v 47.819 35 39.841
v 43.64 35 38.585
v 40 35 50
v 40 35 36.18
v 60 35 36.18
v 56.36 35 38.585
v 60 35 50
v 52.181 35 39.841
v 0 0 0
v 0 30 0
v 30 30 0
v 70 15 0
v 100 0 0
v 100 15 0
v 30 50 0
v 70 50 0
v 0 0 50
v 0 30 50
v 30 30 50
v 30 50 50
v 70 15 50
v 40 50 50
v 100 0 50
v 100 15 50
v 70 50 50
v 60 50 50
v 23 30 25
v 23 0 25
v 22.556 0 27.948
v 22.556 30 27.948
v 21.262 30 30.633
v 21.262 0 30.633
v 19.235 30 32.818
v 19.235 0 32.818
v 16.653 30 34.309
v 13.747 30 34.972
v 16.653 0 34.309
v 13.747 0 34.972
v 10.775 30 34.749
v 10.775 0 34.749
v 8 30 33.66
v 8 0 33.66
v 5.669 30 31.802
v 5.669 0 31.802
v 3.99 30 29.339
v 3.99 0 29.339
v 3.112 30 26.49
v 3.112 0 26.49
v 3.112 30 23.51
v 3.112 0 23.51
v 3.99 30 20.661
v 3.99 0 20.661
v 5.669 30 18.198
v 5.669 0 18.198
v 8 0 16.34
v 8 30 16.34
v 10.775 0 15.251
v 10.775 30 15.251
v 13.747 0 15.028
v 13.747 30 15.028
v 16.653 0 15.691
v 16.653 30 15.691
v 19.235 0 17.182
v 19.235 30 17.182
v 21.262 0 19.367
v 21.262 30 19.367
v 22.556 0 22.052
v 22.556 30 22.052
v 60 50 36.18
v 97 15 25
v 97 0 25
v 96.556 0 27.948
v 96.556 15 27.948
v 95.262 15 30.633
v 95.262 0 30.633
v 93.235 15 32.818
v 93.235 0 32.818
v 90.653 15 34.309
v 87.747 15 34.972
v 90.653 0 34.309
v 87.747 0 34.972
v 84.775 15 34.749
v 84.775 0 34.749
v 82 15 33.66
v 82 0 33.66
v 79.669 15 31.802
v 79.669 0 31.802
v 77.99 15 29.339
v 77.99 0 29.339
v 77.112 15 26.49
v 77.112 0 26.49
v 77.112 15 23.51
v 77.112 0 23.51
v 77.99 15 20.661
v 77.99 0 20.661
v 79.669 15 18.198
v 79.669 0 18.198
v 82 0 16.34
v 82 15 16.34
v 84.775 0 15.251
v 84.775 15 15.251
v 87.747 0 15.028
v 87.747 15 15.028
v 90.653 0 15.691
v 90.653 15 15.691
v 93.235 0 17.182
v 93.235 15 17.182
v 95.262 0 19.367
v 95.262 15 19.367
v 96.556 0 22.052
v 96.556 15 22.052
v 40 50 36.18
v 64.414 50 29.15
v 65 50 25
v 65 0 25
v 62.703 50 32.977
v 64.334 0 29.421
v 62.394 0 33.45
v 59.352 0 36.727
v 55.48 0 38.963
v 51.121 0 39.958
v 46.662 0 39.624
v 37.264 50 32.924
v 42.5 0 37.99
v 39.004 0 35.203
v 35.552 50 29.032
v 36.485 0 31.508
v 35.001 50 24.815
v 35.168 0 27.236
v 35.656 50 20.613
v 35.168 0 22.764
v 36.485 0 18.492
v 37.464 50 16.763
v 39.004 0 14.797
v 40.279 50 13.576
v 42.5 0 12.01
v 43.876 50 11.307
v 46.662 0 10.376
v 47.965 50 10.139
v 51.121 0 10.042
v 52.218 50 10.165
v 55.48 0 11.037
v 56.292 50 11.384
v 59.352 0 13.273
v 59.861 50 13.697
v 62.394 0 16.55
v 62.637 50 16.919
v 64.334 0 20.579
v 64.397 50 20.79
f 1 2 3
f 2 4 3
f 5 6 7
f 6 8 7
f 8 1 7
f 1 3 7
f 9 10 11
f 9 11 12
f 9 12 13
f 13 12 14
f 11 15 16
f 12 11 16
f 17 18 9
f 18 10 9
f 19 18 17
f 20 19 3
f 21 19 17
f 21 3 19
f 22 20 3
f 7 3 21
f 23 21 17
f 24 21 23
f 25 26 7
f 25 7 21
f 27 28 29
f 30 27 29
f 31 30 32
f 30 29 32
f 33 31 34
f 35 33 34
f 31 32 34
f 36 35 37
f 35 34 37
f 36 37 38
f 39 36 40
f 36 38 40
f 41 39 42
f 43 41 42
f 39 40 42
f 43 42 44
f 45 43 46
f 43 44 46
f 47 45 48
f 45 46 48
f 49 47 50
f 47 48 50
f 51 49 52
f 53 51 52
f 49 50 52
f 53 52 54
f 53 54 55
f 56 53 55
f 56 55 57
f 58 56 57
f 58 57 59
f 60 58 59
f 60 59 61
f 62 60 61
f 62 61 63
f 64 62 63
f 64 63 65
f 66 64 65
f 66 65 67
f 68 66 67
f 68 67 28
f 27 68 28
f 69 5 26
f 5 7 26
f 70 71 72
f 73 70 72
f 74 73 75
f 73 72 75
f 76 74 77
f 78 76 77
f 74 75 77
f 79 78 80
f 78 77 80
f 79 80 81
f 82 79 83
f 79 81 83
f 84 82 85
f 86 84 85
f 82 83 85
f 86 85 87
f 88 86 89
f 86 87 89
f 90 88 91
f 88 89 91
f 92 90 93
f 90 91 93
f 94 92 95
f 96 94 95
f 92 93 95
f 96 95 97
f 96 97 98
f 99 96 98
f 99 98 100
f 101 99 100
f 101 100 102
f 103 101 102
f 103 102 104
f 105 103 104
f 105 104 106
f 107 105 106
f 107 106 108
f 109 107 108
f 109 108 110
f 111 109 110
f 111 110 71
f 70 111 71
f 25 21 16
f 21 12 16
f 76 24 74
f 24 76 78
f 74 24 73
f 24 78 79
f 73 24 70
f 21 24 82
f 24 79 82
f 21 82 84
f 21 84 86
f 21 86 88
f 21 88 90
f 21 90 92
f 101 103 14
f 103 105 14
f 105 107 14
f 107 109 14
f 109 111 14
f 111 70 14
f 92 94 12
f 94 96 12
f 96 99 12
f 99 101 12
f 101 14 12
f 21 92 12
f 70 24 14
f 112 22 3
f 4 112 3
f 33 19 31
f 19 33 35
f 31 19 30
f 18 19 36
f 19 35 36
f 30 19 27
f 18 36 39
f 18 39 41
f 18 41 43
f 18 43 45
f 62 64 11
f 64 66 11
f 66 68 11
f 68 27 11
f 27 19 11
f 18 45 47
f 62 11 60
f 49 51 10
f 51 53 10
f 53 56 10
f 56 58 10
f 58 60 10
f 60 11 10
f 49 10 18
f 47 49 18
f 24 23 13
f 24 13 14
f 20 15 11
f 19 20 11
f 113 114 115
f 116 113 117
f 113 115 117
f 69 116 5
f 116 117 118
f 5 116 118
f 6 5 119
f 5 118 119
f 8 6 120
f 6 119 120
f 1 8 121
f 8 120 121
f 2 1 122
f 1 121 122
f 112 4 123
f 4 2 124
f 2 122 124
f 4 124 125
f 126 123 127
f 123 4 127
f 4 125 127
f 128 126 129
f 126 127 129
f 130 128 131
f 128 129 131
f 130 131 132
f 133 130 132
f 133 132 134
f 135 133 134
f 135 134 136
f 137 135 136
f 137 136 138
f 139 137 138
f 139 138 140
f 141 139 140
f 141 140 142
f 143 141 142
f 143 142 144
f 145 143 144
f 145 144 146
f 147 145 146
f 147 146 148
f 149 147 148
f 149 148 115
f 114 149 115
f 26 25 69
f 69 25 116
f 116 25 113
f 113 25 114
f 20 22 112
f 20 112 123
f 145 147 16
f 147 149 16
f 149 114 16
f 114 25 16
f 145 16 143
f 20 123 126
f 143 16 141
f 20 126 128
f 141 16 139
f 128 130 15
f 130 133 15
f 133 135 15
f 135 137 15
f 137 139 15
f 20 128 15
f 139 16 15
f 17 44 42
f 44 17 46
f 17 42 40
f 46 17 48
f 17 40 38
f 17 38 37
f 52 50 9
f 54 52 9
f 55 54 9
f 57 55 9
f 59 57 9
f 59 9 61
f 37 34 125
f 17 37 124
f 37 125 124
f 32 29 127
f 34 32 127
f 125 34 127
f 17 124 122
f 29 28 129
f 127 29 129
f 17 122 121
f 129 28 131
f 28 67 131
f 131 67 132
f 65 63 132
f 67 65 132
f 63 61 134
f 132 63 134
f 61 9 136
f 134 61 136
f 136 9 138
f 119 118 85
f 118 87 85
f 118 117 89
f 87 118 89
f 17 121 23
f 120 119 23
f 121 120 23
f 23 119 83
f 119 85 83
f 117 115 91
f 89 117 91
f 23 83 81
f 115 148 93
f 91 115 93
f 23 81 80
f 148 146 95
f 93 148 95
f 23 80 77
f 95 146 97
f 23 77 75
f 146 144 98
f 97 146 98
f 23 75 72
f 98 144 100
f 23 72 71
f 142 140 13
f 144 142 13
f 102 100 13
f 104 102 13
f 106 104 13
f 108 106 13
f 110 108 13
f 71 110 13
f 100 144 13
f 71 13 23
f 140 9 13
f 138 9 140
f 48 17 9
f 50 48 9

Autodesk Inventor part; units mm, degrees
ref_plane "YZ Plane" through (0, 0, 0) normal (1, 0, 0) x (0, 1, 0)
ref_plane "XZ Plane" through (0, 0, 0) normal (0, 1, 0) x (-1, 0, 0)
ref_plane "XY Plane" through (0, 0, 0) normal (0, 0, 1) x (1, 0, 0)
sketch "Sketch1" plane through (0, 0, 0) normal (0, 0, 1) x (1, 0, 0)
  line L0 (0, 0) -> (100, 0)
  line L1 (100, 0) -> (100, 15)
  line L2 (100, 15) -> (70, 15)
  line L3 (70, 15) -> (70, 50)
  line L4 (70, 50) -> (30, 50)
  line L5 (30, 50) -> (30, 30)
  line L6 (30, 30) -> (0, 30)
  line L7 (0, 30) -> (0, 0)
  dimension "d0" = 100
  dimension "d1" = 15
  dimension "d2" = 30
  dimension "d3" = 35
extrude "Extrusion1" add sketch "Sketch1" along normal blind 50
sketch "Sketch2" plane through (0, 0, 0) normal (0, -1, 0) x (1, 0, 0)
  circle A0 centre (13, 25) radius 10
  circle A1 centre (87, 25) radius 10
  circle A2 centre (50, 25) radius 15
  point P0 (0, 0)
extrude "Extrusion2" cut sketch "Sketch2" against normal blind 50
sketch "Sketch3" plane through (0, 0, 50) normal (0, 0, 1) x (1, 0, 0)
  line L0 (70, 50) -> (30, 50) projected
  line L1 (40, 50) -> (40, 35)
  line L2 (40, 35) -> (60, 35)
  line L3 (60, 35) -> (60, 50)
  line L4 (40, 50) -> (60, 50)
  line L5 (35, 50) -> (65, 50) projected
  point P0 (0, 0)
extrude "Extrusion3" cut sketch "Sketch3" against normal blind 15
properties part number "P3-10"
